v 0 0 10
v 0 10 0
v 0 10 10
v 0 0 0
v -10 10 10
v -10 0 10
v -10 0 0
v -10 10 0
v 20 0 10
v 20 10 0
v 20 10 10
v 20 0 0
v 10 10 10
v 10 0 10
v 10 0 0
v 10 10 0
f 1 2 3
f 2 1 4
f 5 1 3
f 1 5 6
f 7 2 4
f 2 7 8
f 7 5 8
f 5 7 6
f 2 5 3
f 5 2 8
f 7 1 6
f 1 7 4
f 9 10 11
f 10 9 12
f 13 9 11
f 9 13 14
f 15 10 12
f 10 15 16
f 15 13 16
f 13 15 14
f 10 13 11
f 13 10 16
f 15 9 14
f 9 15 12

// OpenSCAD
color([1, 0.5, 0.25, 0.125]) translate([-10, 0, 0]) cube(10);
color("green") translate([10, 0, 0]) cube(10);
